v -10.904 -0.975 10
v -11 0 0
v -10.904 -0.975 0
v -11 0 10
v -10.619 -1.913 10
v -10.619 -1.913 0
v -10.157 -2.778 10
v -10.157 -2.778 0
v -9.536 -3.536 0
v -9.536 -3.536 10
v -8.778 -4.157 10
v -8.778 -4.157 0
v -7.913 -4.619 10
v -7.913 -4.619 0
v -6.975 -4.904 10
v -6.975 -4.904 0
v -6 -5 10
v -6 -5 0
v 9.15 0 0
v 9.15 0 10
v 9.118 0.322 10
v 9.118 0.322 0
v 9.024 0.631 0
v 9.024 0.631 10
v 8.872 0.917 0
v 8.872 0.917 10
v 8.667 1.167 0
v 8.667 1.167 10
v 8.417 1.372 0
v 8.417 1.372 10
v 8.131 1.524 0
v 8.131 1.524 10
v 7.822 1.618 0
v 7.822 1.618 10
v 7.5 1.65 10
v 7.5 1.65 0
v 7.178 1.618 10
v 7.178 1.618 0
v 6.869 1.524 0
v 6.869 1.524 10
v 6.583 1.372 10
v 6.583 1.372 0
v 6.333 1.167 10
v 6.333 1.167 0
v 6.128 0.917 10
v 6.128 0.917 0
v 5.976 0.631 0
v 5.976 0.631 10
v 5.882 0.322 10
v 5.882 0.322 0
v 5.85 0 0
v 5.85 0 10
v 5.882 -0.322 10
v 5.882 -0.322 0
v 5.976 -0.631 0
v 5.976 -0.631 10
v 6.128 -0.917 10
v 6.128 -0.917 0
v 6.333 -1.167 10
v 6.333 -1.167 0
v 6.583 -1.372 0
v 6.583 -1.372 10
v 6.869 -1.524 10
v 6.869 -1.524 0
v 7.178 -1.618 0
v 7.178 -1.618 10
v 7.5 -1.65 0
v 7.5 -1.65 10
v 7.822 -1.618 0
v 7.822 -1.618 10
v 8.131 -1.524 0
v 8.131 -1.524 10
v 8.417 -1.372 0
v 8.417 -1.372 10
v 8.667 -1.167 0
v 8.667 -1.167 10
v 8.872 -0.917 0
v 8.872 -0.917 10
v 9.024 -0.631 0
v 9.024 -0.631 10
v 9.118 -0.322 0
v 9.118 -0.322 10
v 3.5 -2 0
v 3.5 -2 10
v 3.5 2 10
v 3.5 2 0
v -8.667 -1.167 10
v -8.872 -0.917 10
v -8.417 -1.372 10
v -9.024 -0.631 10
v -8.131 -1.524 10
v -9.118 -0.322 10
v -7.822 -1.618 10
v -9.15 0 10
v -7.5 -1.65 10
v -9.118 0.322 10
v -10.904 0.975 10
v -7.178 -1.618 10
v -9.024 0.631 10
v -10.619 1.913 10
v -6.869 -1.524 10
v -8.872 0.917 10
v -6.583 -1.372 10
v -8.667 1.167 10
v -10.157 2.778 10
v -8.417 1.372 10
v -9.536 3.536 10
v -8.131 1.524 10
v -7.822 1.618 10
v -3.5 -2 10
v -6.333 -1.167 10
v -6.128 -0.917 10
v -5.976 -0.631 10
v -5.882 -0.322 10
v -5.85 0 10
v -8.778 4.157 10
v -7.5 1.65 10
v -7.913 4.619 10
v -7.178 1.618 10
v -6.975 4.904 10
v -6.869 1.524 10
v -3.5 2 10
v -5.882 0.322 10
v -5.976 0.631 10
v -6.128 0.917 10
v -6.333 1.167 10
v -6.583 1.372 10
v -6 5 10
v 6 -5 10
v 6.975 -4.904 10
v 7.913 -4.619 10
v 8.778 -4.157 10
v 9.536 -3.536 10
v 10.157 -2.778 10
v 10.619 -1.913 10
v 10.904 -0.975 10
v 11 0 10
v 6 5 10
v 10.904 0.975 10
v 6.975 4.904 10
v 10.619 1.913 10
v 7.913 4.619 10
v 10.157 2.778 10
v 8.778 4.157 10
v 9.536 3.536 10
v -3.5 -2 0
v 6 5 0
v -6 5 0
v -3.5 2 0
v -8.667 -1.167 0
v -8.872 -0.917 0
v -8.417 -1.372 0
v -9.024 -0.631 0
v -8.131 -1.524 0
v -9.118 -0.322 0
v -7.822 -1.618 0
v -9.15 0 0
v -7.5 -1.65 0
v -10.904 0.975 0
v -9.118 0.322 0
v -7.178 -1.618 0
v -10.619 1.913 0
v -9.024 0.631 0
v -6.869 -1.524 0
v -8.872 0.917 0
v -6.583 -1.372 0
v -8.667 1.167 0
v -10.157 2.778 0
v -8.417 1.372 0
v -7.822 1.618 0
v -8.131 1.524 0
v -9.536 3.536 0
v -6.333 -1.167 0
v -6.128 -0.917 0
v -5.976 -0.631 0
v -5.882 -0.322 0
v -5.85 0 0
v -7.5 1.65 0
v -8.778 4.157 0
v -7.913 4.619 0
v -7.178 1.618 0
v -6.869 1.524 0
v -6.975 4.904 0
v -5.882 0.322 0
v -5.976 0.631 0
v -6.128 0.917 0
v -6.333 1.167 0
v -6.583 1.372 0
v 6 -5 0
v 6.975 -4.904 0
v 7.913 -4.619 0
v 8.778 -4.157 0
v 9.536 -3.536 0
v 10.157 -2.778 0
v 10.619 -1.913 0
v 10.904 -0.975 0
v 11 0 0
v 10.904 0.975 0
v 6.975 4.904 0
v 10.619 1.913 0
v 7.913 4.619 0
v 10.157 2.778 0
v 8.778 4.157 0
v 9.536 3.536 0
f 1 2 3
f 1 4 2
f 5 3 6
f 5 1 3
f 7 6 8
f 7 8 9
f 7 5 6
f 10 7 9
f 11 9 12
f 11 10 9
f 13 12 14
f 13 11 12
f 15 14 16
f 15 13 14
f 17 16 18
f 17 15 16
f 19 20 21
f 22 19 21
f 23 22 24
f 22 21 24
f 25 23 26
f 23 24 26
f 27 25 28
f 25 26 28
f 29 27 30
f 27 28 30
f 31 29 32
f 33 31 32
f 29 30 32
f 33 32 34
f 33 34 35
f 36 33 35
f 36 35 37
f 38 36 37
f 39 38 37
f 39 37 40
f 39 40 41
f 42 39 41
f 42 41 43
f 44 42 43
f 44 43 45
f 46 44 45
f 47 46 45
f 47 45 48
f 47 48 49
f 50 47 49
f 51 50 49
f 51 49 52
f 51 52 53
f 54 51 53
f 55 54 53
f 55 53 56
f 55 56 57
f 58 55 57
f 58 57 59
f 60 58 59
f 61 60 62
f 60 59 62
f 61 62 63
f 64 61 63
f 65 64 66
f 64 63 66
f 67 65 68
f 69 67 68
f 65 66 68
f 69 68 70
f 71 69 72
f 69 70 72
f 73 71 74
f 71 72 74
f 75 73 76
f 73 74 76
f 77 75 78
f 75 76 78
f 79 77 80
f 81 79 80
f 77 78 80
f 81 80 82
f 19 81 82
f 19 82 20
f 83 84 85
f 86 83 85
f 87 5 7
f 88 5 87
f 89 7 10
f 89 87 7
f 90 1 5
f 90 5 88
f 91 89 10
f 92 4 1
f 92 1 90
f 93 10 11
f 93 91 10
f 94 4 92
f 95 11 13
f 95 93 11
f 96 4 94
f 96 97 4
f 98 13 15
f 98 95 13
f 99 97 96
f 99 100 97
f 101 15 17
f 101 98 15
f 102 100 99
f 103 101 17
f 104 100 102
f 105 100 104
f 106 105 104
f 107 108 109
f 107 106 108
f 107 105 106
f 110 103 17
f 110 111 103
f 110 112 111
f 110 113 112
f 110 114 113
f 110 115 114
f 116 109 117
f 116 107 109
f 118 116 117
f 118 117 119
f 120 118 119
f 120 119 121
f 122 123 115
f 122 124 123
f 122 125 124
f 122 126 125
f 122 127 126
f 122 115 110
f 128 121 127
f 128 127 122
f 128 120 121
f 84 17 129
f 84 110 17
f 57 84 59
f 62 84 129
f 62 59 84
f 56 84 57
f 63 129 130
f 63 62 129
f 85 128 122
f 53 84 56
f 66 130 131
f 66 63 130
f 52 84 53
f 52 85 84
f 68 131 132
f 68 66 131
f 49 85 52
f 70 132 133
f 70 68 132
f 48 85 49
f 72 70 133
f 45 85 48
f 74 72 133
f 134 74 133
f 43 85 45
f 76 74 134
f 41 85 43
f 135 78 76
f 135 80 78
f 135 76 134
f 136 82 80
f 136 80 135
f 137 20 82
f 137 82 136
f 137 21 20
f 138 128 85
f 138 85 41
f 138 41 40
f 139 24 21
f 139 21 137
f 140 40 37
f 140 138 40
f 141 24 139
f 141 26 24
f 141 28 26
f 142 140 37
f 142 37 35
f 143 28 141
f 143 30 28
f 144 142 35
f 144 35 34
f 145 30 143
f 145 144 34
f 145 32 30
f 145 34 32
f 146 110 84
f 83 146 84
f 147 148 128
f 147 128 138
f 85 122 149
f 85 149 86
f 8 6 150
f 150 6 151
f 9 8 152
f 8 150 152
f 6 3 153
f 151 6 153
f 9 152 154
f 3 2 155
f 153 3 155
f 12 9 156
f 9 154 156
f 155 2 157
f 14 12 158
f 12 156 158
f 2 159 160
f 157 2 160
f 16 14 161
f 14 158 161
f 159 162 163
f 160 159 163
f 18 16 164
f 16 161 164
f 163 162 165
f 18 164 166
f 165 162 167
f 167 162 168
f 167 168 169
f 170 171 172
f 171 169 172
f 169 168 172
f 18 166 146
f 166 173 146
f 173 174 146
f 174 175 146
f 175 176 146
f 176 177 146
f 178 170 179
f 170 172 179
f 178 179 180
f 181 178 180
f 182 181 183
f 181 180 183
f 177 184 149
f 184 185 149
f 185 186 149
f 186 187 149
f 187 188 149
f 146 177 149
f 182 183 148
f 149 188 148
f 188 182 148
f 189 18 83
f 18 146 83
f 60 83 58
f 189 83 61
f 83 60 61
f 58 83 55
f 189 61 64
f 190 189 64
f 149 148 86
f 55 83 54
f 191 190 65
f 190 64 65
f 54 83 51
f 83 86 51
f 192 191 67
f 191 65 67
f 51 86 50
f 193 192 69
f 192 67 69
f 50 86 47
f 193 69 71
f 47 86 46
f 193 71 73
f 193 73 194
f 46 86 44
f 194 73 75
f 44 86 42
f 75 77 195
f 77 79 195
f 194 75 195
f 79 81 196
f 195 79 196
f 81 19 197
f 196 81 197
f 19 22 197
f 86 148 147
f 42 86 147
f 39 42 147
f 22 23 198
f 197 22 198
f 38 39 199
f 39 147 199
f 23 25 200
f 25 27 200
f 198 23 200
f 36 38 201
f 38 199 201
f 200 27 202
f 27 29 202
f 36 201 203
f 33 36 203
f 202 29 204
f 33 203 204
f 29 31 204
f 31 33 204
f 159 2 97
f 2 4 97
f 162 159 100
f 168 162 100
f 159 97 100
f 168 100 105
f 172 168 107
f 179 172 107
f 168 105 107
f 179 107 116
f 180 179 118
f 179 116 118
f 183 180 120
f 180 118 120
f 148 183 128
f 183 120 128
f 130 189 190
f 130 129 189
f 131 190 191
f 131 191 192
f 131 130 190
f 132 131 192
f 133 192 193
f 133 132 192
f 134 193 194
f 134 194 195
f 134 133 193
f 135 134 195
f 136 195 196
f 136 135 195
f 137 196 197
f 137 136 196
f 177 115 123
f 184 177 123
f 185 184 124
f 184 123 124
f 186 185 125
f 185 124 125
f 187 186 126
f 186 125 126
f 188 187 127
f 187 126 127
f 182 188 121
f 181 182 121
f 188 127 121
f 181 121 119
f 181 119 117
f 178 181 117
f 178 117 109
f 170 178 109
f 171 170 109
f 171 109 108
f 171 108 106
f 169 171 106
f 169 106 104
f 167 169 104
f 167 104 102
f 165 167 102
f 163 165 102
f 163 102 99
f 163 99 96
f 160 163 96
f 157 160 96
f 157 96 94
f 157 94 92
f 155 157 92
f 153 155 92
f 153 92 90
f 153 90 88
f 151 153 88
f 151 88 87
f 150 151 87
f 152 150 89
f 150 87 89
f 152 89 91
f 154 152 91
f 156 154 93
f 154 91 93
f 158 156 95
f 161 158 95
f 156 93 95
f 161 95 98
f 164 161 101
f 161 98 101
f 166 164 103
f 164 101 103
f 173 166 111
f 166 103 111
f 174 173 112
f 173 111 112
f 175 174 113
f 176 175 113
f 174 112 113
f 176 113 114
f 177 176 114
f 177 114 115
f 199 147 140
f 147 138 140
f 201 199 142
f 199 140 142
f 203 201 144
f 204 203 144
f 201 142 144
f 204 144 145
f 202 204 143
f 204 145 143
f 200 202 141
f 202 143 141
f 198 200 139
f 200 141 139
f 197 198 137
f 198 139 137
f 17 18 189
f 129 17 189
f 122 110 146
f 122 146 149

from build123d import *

# Parameters (mm, degrees)
F0_W     = 22
F0_H     = 10
F1_DEPTH = 10
F2_R     = 1.65
F2_W     = 7
F2_H     = 4
F3_DEPTH = 10.001
F4_R     = 4.99999


# Not quite as in the source:
# - a fillet or chamfer is up to 0.001 mm smaller than in the source, because OpenCascade refuses the exact size


with BuildPart() as f1:
    # F0 (on Top) → F1 (new body)
    with BuildSketch(Plane.XY):
        Rectangle(F0_W, F0_H)
    extrude(amount=F1_DEPTH)

    # F2 (on face) → F3 (cut, through all)
    with BuildSketch(Plane.XY.offset(10)):
        with Locations((-7.5, 0)):
            Circle(F2_R)
        with Locations((7.5, 0)):
            Circle(F2_R)
        Rectangle(F2_W, F2_H)
    extrude(amount=-F3_DEPTH, mode=Mode.SUBTRACT)

    # F4 (radius 5 in the source; OpenCascade refuses exactly that, so slightly less here)
    f4_edges = [f1.edges().sort_by_distance(p)[0] for p in [
        (-11, 5, 5),
        (-11, -5, 5),
        (11, 5, 5),
        (11, -5, 5),
    ]]
    fillet(f4_edges, radius=F4_R)


solid = f1.part
